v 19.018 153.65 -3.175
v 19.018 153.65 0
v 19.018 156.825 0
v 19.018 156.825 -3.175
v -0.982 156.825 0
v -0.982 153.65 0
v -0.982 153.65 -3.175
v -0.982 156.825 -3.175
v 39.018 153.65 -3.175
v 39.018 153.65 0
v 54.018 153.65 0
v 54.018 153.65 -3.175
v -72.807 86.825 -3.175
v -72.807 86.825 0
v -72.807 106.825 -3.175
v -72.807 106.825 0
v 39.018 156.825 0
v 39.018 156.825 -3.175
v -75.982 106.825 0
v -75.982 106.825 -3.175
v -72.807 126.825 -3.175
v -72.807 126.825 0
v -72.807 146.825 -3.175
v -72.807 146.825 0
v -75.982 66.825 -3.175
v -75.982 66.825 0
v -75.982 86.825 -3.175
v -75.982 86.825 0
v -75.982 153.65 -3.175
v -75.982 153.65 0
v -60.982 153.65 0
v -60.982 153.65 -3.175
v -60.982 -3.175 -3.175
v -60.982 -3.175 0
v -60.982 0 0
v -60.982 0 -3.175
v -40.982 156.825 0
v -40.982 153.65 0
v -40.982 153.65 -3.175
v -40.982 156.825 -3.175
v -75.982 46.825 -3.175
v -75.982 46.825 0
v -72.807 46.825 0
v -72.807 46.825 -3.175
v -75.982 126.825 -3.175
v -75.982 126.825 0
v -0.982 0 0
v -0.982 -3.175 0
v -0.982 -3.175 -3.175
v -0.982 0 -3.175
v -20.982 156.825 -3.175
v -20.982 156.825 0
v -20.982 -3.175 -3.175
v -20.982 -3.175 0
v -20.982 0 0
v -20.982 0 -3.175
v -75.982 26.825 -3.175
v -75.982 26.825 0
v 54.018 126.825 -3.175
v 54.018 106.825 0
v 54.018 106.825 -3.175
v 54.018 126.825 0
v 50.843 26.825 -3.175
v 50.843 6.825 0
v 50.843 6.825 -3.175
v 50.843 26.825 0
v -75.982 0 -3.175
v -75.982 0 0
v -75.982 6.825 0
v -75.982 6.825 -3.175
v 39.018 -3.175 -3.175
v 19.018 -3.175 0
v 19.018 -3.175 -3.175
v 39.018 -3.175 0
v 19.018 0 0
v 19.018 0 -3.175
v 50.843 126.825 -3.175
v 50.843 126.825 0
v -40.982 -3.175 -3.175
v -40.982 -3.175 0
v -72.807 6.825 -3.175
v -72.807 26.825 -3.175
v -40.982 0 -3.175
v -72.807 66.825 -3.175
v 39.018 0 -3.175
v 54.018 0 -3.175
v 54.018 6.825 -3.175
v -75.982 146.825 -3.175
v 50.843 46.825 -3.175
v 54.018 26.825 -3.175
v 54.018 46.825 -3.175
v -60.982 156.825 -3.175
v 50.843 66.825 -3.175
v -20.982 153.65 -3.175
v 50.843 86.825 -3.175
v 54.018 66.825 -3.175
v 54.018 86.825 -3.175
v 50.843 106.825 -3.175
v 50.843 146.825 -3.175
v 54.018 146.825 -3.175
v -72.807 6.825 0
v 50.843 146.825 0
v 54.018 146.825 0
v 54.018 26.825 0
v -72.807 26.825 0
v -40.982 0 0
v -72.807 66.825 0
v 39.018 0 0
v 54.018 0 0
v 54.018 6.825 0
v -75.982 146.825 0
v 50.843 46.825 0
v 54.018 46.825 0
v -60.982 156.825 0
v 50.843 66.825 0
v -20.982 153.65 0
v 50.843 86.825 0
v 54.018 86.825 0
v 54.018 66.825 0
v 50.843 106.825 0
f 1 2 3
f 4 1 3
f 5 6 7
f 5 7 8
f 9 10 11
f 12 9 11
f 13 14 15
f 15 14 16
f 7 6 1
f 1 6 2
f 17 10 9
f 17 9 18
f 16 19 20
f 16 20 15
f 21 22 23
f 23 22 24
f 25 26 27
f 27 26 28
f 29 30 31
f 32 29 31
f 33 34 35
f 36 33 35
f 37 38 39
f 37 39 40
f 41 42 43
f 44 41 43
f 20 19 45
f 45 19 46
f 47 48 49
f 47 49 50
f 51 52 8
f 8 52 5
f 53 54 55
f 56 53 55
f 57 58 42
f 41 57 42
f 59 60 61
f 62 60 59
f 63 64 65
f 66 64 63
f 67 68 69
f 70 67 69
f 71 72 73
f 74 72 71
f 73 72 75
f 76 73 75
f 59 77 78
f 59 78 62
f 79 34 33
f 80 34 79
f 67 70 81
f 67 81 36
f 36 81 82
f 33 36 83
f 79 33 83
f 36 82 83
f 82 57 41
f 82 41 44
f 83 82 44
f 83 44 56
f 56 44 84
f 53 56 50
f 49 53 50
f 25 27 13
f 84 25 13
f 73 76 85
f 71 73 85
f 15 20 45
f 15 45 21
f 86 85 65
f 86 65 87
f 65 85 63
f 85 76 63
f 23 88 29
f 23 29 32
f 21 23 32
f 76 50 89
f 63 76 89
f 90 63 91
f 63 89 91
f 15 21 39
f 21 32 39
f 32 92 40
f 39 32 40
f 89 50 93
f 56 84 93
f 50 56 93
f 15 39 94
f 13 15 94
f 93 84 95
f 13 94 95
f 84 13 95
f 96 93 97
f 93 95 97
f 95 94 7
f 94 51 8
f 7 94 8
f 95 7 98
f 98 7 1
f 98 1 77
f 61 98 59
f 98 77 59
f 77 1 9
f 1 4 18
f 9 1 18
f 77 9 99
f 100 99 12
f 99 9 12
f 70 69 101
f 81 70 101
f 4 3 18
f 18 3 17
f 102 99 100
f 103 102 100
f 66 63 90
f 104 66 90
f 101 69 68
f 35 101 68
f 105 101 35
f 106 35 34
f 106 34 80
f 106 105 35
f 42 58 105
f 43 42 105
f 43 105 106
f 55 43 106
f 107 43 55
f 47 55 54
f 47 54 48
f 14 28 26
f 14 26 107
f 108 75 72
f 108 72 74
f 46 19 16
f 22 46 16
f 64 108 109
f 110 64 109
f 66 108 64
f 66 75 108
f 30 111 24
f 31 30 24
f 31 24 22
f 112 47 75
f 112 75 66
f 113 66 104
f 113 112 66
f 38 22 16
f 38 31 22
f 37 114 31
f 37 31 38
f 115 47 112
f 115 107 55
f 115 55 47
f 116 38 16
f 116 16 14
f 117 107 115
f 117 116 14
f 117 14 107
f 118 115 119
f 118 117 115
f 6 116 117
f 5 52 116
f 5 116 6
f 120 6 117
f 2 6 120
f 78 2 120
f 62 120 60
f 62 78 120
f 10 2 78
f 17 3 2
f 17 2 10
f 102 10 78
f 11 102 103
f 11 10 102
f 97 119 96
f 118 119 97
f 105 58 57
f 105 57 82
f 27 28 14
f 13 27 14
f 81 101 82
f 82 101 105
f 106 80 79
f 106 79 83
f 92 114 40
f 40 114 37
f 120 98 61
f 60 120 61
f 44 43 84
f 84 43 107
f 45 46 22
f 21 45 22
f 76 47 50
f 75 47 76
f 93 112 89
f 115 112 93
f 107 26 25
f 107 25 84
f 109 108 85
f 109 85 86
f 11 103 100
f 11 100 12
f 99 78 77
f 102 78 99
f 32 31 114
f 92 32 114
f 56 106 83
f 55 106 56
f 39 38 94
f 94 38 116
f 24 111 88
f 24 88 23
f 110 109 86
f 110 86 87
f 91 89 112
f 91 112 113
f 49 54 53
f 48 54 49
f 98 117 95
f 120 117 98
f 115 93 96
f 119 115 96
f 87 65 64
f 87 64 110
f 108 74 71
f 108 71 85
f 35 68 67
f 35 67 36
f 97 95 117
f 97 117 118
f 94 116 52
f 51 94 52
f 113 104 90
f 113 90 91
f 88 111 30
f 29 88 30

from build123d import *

# Parameters (mm, degrees)
SKETCH1_W           = 130
SKETCH1_H           = 160
BOSS_EXTRUDE1_DEPTH = 3.175
SKETCH2_W           = 3.175
SKETCH2_H           = 20
SKETCH2_W_2         = 15
SKETCH2_H_2         = 3.175
SKETCH2_W_3         = 20
CUT_EXTRUDE1_DEPTH  = 3.175


with BuildPart() as part:
    # Sketch1 → Boss-Extrude1 (new body)
    with BuildSketch(Plane.XY):
        with Locations((-10.981871877, 76.825)):
            Rectangle(SKETCH1_W, SKETCH1_H)
    extrude(amount=-BOSS_EXTRUDE1_DEPTH)

    # Sketch2 → Cut-Extrude1 (cut)
    with BuildSketch(Plane.XY):
        with Locations((-74.394371877, 56.825)):
            Rectangle(SKETCH2_W, SKETCH2_H)
        with Locations((-74.394371877, 96.825)):
            Rectangle(SKETCH2_W, SKETCH2_H)
        with Locations((-74.394371877, 136.825)):
            Rectangle(SKETCH2_W, SKETCH2_H)
        with Locations((-68.481871877, 155.2375)):
            Rectangle(SKETCH2_W_2, SKETCH2_H_2)
        with Locations((-30.981871877, 155.2375)):
            Rectangle(SKETCH2_W_3, SKETCH2_H_2)
        with Locations((9.018128123, 155.2375)):
            Rectangle(SKETCH2_W_3, SKETCH2_H_2)
        with Locations((46.518128123, 155.2375)):
            Rectangle(SKETCH2_W_2, SKETCH2_H_2)
        with Locations((52.430628123, 136.825)):
            Rectangle(SKETCH2_W, SKETCH2_H)
        with Locations((52.430628123, 96.825)):
            Rectangle(SKETCH2_W, SKETCH2_H)
        with Locations((52.430628123, 56.825)):
            Rectangle(SKETCH2_W, SKETCH2_H)
        with Locations((52.430628123, 16.825)):
            Rectangle(SKETCH2_W, SKETCH2_H)
        with Locations((46.518128123, -1.5875)):
            Rectangle(SKETCH2_W_2, SKETCH2_H_2)
        with Locations((9.018128123, -1.5875)):
            Rectangle(SKETCH2_W_3, SKETCH2_H_2)
        with Locations((-30.981871877, -1.5875)):
            Rectangle(SKETCH2_W_3, SKETCH2_H_2)
        with Locations((-74.394371877, 16.825)):
            Rectangle(SKETCH2_W, SKETCH2_H)
        with Locations((-68.481871877, -1.5875)):
            Rectangle(SKETCH2_W_2, SKETCH2_H_2)
    extrude(amount=-CUT_EXTRUDE1_DEPTH, mode=Mode.SUBTRACT)


solid = part.part
